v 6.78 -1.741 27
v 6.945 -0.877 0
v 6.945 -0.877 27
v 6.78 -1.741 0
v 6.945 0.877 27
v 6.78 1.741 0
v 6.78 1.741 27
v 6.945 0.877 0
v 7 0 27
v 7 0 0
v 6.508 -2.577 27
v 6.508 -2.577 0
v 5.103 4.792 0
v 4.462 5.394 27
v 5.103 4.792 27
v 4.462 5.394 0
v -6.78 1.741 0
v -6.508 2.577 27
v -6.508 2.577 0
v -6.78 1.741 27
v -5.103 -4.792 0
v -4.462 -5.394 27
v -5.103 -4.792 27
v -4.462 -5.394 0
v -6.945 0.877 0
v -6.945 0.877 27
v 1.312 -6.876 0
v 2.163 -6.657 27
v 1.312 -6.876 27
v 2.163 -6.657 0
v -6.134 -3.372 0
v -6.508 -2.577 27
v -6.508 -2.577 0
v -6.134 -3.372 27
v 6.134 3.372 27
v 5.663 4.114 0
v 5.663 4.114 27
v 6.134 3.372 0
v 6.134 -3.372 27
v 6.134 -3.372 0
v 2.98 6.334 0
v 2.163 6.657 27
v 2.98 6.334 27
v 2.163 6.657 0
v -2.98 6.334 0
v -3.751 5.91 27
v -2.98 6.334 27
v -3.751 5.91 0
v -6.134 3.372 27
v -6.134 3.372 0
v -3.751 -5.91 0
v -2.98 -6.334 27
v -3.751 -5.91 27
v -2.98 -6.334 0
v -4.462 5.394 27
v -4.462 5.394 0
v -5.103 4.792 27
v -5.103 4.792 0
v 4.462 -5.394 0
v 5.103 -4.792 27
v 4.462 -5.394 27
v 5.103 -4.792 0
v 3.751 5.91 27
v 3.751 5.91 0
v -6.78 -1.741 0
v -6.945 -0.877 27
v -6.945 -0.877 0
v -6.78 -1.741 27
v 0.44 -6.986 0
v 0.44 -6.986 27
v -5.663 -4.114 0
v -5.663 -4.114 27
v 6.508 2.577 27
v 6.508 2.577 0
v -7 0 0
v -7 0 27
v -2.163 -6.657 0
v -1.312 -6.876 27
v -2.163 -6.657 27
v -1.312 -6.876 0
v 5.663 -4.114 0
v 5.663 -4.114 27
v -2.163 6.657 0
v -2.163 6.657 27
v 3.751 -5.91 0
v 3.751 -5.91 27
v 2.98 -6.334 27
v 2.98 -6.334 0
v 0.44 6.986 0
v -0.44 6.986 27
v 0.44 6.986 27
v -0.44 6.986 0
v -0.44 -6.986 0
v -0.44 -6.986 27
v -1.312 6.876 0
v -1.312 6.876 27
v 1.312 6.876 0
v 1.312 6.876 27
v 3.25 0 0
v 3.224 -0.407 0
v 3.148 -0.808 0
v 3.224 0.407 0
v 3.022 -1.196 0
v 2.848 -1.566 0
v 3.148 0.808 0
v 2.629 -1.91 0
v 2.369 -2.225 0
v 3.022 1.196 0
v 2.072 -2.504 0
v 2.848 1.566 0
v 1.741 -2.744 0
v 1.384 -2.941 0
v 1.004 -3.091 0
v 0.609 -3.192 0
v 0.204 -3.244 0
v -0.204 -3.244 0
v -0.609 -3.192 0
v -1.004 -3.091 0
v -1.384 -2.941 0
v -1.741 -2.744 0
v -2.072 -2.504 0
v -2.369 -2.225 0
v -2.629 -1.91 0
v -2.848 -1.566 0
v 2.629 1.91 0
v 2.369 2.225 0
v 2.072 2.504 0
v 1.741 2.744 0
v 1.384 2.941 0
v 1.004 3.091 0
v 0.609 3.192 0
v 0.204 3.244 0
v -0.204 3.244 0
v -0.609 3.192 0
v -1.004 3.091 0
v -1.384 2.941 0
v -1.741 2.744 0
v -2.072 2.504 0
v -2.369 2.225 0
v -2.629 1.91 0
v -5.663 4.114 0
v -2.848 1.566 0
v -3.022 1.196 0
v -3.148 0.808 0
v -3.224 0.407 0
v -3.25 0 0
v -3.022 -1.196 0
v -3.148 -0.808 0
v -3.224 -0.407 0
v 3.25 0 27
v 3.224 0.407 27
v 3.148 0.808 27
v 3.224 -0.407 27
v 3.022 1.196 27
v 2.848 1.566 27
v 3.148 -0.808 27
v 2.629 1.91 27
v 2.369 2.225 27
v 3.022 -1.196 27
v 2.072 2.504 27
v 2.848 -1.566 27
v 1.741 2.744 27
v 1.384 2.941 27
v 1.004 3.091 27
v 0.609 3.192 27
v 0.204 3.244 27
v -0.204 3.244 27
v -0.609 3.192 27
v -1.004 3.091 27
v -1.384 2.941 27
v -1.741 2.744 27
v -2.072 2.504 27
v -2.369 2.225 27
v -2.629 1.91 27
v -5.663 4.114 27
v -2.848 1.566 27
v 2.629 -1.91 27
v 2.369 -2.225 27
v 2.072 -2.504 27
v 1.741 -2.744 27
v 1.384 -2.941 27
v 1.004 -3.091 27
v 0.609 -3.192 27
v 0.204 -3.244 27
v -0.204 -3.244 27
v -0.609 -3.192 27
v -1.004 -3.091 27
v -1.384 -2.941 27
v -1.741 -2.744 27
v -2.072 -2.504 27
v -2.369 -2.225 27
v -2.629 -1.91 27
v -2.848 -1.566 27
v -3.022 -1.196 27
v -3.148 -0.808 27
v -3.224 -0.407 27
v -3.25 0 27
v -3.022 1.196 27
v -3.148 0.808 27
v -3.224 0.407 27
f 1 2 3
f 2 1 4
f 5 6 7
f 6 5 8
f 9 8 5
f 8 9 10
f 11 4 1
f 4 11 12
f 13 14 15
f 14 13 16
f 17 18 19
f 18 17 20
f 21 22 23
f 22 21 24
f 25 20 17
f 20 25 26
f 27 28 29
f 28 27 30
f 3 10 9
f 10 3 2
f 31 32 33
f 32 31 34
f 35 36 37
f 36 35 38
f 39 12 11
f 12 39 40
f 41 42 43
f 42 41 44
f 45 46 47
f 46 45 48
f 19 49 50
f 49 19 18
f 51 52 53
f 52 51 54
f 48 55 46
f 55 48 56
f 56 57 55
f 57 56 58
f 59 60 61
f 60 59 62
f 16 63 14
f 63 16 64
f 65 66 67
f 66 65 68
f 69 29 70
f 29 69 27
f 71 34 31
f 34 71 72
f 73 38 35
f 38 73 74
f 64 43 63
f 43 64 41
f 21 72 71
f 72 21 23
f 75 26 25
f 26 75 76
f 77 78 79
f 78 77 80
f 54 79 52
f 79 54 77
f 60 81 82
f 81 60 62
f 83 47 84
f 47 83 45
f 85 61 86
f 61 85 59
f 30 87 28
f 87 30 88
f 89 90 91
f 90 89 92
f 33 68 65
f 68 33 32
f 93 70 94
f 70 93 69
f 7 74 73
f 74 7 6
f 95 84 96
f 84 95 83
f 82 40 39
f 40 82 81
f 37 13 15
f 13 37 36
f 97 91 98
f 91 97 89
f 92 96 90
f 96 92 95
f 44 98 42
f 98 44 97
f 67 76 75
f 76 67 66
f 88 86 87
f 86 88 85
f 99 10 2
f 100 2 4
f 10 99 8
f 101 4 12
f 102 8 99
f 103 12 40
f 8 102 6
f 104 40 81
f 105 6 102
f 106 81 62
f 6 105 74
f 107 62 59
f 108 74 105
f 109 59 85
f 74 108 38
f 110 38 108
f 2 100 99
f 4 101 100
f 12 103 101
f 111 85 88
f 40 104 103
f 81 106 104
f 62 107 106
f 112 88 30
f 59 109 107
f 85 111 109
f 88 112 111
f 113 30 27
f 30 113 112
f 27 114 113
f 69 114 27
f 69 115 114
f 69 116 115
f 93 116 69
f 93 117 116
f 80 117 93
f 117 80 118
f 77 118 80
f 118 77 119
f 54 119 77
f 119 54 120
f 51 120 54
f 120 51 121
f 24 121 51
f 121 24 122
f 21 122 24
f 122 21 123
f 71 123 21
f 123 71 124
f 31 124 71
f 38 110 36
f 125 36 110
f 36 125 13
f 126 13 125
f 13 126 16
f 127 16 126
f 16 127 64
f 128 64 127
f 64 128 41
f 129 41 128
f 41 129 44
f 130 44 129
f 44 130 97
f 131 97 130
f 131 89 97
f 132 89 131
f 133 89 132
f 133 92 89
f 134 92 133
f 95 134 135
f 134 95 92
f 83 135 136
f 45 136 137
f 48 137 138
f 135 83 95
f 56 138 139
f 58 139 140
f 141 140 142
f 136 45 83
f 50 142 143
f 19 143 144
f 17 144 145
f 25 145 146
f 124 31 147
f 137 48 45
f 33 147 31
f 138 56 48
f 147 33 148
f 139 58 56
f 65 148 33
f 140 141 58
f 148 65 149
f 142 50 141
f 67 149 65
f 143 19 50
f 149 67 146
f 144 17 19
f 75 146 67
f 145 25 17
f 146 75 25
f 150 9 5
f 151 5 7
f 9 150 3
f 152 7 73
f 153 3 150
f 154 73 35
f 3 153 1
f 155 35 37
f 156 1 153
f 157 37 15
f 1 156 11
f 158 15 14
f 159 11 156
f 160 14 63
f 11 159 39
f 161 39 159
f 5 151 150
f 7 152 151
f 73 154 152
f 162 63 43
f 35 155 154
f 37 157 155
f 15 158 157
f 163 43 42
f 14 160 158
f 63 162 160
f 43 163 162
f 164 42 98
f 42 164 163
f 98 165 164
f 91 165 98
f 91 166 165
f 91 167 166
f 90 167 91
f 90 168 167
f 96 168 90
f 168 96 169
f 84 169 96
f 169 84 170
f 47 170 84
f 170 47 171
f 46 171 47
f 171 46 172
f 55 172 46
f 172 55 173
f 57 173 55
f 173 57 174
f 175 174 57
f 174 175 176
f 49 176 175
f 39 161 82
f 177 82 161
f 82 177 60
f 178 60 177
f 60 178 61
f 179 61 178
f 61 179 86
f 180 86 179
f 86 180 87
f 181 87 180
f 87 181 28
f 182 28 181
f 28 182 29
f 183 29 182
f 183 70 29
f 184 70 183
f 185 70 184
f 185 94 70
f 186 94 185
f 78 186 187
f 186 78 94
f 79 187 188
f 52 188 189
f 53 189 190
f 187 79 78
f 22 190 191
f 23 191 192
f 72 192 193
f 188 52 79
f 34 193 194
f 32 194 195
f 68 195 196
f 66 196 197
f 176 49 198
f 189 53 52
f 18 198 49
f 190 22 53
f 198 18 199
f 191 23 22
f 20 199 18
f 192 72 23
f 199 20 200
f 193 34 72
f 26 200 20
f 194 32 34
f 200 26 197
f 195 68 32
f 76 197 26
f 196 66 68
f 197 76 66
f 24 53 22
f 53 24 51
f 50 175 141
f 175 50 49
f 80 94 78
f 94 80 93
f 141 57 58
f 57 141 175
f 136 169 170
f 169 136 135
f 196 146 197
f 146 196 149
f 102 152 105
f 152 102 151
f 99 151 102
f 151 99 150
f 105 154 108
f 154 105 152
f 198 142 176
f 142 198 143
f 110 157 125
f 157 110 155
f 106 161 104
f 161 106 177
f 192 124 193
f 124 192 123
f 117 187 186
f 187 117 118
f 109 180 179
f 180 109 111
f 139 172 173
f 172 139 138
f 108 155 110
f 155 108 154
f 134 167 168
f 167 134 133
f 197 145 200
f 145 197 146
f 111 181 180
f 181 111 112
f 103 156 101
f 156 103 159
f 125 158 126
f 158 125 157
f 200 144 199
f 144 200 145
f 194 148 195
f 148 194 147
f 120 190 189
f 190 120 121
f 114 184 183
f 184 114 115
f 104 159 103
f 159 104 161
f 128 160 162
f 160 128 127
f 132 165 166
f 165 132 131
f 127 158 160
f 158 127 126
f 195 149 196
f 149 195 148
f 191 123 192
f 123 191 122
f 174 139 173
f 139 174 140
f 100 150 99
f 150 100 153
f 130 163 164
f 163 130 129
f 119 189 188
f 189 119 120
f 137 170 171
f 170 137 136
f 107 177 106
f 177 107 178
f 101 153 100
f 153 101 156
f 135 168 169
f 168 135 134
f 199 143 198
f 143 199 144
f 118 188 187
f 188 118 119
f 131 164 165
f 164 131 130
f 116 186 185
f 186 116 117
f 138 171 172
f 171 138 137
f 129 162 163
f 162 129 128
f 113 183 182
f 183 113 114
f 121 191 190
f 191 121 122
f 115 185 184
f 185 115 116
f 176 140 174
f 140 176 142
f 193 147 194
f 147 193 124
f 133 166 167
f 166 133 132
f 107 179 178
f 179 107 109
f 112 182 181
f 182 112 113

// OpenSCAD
$fn = 50;


difference() {
	union() {
		cylinder(h = 27, r = 7.0000000000);
	}
	union() {
		translate(v = [0.0000000000, 0.0000000000, -100.0000000000]) {
			cylinder(h = 200, r = 3.2500000000);
		}
	}
}
